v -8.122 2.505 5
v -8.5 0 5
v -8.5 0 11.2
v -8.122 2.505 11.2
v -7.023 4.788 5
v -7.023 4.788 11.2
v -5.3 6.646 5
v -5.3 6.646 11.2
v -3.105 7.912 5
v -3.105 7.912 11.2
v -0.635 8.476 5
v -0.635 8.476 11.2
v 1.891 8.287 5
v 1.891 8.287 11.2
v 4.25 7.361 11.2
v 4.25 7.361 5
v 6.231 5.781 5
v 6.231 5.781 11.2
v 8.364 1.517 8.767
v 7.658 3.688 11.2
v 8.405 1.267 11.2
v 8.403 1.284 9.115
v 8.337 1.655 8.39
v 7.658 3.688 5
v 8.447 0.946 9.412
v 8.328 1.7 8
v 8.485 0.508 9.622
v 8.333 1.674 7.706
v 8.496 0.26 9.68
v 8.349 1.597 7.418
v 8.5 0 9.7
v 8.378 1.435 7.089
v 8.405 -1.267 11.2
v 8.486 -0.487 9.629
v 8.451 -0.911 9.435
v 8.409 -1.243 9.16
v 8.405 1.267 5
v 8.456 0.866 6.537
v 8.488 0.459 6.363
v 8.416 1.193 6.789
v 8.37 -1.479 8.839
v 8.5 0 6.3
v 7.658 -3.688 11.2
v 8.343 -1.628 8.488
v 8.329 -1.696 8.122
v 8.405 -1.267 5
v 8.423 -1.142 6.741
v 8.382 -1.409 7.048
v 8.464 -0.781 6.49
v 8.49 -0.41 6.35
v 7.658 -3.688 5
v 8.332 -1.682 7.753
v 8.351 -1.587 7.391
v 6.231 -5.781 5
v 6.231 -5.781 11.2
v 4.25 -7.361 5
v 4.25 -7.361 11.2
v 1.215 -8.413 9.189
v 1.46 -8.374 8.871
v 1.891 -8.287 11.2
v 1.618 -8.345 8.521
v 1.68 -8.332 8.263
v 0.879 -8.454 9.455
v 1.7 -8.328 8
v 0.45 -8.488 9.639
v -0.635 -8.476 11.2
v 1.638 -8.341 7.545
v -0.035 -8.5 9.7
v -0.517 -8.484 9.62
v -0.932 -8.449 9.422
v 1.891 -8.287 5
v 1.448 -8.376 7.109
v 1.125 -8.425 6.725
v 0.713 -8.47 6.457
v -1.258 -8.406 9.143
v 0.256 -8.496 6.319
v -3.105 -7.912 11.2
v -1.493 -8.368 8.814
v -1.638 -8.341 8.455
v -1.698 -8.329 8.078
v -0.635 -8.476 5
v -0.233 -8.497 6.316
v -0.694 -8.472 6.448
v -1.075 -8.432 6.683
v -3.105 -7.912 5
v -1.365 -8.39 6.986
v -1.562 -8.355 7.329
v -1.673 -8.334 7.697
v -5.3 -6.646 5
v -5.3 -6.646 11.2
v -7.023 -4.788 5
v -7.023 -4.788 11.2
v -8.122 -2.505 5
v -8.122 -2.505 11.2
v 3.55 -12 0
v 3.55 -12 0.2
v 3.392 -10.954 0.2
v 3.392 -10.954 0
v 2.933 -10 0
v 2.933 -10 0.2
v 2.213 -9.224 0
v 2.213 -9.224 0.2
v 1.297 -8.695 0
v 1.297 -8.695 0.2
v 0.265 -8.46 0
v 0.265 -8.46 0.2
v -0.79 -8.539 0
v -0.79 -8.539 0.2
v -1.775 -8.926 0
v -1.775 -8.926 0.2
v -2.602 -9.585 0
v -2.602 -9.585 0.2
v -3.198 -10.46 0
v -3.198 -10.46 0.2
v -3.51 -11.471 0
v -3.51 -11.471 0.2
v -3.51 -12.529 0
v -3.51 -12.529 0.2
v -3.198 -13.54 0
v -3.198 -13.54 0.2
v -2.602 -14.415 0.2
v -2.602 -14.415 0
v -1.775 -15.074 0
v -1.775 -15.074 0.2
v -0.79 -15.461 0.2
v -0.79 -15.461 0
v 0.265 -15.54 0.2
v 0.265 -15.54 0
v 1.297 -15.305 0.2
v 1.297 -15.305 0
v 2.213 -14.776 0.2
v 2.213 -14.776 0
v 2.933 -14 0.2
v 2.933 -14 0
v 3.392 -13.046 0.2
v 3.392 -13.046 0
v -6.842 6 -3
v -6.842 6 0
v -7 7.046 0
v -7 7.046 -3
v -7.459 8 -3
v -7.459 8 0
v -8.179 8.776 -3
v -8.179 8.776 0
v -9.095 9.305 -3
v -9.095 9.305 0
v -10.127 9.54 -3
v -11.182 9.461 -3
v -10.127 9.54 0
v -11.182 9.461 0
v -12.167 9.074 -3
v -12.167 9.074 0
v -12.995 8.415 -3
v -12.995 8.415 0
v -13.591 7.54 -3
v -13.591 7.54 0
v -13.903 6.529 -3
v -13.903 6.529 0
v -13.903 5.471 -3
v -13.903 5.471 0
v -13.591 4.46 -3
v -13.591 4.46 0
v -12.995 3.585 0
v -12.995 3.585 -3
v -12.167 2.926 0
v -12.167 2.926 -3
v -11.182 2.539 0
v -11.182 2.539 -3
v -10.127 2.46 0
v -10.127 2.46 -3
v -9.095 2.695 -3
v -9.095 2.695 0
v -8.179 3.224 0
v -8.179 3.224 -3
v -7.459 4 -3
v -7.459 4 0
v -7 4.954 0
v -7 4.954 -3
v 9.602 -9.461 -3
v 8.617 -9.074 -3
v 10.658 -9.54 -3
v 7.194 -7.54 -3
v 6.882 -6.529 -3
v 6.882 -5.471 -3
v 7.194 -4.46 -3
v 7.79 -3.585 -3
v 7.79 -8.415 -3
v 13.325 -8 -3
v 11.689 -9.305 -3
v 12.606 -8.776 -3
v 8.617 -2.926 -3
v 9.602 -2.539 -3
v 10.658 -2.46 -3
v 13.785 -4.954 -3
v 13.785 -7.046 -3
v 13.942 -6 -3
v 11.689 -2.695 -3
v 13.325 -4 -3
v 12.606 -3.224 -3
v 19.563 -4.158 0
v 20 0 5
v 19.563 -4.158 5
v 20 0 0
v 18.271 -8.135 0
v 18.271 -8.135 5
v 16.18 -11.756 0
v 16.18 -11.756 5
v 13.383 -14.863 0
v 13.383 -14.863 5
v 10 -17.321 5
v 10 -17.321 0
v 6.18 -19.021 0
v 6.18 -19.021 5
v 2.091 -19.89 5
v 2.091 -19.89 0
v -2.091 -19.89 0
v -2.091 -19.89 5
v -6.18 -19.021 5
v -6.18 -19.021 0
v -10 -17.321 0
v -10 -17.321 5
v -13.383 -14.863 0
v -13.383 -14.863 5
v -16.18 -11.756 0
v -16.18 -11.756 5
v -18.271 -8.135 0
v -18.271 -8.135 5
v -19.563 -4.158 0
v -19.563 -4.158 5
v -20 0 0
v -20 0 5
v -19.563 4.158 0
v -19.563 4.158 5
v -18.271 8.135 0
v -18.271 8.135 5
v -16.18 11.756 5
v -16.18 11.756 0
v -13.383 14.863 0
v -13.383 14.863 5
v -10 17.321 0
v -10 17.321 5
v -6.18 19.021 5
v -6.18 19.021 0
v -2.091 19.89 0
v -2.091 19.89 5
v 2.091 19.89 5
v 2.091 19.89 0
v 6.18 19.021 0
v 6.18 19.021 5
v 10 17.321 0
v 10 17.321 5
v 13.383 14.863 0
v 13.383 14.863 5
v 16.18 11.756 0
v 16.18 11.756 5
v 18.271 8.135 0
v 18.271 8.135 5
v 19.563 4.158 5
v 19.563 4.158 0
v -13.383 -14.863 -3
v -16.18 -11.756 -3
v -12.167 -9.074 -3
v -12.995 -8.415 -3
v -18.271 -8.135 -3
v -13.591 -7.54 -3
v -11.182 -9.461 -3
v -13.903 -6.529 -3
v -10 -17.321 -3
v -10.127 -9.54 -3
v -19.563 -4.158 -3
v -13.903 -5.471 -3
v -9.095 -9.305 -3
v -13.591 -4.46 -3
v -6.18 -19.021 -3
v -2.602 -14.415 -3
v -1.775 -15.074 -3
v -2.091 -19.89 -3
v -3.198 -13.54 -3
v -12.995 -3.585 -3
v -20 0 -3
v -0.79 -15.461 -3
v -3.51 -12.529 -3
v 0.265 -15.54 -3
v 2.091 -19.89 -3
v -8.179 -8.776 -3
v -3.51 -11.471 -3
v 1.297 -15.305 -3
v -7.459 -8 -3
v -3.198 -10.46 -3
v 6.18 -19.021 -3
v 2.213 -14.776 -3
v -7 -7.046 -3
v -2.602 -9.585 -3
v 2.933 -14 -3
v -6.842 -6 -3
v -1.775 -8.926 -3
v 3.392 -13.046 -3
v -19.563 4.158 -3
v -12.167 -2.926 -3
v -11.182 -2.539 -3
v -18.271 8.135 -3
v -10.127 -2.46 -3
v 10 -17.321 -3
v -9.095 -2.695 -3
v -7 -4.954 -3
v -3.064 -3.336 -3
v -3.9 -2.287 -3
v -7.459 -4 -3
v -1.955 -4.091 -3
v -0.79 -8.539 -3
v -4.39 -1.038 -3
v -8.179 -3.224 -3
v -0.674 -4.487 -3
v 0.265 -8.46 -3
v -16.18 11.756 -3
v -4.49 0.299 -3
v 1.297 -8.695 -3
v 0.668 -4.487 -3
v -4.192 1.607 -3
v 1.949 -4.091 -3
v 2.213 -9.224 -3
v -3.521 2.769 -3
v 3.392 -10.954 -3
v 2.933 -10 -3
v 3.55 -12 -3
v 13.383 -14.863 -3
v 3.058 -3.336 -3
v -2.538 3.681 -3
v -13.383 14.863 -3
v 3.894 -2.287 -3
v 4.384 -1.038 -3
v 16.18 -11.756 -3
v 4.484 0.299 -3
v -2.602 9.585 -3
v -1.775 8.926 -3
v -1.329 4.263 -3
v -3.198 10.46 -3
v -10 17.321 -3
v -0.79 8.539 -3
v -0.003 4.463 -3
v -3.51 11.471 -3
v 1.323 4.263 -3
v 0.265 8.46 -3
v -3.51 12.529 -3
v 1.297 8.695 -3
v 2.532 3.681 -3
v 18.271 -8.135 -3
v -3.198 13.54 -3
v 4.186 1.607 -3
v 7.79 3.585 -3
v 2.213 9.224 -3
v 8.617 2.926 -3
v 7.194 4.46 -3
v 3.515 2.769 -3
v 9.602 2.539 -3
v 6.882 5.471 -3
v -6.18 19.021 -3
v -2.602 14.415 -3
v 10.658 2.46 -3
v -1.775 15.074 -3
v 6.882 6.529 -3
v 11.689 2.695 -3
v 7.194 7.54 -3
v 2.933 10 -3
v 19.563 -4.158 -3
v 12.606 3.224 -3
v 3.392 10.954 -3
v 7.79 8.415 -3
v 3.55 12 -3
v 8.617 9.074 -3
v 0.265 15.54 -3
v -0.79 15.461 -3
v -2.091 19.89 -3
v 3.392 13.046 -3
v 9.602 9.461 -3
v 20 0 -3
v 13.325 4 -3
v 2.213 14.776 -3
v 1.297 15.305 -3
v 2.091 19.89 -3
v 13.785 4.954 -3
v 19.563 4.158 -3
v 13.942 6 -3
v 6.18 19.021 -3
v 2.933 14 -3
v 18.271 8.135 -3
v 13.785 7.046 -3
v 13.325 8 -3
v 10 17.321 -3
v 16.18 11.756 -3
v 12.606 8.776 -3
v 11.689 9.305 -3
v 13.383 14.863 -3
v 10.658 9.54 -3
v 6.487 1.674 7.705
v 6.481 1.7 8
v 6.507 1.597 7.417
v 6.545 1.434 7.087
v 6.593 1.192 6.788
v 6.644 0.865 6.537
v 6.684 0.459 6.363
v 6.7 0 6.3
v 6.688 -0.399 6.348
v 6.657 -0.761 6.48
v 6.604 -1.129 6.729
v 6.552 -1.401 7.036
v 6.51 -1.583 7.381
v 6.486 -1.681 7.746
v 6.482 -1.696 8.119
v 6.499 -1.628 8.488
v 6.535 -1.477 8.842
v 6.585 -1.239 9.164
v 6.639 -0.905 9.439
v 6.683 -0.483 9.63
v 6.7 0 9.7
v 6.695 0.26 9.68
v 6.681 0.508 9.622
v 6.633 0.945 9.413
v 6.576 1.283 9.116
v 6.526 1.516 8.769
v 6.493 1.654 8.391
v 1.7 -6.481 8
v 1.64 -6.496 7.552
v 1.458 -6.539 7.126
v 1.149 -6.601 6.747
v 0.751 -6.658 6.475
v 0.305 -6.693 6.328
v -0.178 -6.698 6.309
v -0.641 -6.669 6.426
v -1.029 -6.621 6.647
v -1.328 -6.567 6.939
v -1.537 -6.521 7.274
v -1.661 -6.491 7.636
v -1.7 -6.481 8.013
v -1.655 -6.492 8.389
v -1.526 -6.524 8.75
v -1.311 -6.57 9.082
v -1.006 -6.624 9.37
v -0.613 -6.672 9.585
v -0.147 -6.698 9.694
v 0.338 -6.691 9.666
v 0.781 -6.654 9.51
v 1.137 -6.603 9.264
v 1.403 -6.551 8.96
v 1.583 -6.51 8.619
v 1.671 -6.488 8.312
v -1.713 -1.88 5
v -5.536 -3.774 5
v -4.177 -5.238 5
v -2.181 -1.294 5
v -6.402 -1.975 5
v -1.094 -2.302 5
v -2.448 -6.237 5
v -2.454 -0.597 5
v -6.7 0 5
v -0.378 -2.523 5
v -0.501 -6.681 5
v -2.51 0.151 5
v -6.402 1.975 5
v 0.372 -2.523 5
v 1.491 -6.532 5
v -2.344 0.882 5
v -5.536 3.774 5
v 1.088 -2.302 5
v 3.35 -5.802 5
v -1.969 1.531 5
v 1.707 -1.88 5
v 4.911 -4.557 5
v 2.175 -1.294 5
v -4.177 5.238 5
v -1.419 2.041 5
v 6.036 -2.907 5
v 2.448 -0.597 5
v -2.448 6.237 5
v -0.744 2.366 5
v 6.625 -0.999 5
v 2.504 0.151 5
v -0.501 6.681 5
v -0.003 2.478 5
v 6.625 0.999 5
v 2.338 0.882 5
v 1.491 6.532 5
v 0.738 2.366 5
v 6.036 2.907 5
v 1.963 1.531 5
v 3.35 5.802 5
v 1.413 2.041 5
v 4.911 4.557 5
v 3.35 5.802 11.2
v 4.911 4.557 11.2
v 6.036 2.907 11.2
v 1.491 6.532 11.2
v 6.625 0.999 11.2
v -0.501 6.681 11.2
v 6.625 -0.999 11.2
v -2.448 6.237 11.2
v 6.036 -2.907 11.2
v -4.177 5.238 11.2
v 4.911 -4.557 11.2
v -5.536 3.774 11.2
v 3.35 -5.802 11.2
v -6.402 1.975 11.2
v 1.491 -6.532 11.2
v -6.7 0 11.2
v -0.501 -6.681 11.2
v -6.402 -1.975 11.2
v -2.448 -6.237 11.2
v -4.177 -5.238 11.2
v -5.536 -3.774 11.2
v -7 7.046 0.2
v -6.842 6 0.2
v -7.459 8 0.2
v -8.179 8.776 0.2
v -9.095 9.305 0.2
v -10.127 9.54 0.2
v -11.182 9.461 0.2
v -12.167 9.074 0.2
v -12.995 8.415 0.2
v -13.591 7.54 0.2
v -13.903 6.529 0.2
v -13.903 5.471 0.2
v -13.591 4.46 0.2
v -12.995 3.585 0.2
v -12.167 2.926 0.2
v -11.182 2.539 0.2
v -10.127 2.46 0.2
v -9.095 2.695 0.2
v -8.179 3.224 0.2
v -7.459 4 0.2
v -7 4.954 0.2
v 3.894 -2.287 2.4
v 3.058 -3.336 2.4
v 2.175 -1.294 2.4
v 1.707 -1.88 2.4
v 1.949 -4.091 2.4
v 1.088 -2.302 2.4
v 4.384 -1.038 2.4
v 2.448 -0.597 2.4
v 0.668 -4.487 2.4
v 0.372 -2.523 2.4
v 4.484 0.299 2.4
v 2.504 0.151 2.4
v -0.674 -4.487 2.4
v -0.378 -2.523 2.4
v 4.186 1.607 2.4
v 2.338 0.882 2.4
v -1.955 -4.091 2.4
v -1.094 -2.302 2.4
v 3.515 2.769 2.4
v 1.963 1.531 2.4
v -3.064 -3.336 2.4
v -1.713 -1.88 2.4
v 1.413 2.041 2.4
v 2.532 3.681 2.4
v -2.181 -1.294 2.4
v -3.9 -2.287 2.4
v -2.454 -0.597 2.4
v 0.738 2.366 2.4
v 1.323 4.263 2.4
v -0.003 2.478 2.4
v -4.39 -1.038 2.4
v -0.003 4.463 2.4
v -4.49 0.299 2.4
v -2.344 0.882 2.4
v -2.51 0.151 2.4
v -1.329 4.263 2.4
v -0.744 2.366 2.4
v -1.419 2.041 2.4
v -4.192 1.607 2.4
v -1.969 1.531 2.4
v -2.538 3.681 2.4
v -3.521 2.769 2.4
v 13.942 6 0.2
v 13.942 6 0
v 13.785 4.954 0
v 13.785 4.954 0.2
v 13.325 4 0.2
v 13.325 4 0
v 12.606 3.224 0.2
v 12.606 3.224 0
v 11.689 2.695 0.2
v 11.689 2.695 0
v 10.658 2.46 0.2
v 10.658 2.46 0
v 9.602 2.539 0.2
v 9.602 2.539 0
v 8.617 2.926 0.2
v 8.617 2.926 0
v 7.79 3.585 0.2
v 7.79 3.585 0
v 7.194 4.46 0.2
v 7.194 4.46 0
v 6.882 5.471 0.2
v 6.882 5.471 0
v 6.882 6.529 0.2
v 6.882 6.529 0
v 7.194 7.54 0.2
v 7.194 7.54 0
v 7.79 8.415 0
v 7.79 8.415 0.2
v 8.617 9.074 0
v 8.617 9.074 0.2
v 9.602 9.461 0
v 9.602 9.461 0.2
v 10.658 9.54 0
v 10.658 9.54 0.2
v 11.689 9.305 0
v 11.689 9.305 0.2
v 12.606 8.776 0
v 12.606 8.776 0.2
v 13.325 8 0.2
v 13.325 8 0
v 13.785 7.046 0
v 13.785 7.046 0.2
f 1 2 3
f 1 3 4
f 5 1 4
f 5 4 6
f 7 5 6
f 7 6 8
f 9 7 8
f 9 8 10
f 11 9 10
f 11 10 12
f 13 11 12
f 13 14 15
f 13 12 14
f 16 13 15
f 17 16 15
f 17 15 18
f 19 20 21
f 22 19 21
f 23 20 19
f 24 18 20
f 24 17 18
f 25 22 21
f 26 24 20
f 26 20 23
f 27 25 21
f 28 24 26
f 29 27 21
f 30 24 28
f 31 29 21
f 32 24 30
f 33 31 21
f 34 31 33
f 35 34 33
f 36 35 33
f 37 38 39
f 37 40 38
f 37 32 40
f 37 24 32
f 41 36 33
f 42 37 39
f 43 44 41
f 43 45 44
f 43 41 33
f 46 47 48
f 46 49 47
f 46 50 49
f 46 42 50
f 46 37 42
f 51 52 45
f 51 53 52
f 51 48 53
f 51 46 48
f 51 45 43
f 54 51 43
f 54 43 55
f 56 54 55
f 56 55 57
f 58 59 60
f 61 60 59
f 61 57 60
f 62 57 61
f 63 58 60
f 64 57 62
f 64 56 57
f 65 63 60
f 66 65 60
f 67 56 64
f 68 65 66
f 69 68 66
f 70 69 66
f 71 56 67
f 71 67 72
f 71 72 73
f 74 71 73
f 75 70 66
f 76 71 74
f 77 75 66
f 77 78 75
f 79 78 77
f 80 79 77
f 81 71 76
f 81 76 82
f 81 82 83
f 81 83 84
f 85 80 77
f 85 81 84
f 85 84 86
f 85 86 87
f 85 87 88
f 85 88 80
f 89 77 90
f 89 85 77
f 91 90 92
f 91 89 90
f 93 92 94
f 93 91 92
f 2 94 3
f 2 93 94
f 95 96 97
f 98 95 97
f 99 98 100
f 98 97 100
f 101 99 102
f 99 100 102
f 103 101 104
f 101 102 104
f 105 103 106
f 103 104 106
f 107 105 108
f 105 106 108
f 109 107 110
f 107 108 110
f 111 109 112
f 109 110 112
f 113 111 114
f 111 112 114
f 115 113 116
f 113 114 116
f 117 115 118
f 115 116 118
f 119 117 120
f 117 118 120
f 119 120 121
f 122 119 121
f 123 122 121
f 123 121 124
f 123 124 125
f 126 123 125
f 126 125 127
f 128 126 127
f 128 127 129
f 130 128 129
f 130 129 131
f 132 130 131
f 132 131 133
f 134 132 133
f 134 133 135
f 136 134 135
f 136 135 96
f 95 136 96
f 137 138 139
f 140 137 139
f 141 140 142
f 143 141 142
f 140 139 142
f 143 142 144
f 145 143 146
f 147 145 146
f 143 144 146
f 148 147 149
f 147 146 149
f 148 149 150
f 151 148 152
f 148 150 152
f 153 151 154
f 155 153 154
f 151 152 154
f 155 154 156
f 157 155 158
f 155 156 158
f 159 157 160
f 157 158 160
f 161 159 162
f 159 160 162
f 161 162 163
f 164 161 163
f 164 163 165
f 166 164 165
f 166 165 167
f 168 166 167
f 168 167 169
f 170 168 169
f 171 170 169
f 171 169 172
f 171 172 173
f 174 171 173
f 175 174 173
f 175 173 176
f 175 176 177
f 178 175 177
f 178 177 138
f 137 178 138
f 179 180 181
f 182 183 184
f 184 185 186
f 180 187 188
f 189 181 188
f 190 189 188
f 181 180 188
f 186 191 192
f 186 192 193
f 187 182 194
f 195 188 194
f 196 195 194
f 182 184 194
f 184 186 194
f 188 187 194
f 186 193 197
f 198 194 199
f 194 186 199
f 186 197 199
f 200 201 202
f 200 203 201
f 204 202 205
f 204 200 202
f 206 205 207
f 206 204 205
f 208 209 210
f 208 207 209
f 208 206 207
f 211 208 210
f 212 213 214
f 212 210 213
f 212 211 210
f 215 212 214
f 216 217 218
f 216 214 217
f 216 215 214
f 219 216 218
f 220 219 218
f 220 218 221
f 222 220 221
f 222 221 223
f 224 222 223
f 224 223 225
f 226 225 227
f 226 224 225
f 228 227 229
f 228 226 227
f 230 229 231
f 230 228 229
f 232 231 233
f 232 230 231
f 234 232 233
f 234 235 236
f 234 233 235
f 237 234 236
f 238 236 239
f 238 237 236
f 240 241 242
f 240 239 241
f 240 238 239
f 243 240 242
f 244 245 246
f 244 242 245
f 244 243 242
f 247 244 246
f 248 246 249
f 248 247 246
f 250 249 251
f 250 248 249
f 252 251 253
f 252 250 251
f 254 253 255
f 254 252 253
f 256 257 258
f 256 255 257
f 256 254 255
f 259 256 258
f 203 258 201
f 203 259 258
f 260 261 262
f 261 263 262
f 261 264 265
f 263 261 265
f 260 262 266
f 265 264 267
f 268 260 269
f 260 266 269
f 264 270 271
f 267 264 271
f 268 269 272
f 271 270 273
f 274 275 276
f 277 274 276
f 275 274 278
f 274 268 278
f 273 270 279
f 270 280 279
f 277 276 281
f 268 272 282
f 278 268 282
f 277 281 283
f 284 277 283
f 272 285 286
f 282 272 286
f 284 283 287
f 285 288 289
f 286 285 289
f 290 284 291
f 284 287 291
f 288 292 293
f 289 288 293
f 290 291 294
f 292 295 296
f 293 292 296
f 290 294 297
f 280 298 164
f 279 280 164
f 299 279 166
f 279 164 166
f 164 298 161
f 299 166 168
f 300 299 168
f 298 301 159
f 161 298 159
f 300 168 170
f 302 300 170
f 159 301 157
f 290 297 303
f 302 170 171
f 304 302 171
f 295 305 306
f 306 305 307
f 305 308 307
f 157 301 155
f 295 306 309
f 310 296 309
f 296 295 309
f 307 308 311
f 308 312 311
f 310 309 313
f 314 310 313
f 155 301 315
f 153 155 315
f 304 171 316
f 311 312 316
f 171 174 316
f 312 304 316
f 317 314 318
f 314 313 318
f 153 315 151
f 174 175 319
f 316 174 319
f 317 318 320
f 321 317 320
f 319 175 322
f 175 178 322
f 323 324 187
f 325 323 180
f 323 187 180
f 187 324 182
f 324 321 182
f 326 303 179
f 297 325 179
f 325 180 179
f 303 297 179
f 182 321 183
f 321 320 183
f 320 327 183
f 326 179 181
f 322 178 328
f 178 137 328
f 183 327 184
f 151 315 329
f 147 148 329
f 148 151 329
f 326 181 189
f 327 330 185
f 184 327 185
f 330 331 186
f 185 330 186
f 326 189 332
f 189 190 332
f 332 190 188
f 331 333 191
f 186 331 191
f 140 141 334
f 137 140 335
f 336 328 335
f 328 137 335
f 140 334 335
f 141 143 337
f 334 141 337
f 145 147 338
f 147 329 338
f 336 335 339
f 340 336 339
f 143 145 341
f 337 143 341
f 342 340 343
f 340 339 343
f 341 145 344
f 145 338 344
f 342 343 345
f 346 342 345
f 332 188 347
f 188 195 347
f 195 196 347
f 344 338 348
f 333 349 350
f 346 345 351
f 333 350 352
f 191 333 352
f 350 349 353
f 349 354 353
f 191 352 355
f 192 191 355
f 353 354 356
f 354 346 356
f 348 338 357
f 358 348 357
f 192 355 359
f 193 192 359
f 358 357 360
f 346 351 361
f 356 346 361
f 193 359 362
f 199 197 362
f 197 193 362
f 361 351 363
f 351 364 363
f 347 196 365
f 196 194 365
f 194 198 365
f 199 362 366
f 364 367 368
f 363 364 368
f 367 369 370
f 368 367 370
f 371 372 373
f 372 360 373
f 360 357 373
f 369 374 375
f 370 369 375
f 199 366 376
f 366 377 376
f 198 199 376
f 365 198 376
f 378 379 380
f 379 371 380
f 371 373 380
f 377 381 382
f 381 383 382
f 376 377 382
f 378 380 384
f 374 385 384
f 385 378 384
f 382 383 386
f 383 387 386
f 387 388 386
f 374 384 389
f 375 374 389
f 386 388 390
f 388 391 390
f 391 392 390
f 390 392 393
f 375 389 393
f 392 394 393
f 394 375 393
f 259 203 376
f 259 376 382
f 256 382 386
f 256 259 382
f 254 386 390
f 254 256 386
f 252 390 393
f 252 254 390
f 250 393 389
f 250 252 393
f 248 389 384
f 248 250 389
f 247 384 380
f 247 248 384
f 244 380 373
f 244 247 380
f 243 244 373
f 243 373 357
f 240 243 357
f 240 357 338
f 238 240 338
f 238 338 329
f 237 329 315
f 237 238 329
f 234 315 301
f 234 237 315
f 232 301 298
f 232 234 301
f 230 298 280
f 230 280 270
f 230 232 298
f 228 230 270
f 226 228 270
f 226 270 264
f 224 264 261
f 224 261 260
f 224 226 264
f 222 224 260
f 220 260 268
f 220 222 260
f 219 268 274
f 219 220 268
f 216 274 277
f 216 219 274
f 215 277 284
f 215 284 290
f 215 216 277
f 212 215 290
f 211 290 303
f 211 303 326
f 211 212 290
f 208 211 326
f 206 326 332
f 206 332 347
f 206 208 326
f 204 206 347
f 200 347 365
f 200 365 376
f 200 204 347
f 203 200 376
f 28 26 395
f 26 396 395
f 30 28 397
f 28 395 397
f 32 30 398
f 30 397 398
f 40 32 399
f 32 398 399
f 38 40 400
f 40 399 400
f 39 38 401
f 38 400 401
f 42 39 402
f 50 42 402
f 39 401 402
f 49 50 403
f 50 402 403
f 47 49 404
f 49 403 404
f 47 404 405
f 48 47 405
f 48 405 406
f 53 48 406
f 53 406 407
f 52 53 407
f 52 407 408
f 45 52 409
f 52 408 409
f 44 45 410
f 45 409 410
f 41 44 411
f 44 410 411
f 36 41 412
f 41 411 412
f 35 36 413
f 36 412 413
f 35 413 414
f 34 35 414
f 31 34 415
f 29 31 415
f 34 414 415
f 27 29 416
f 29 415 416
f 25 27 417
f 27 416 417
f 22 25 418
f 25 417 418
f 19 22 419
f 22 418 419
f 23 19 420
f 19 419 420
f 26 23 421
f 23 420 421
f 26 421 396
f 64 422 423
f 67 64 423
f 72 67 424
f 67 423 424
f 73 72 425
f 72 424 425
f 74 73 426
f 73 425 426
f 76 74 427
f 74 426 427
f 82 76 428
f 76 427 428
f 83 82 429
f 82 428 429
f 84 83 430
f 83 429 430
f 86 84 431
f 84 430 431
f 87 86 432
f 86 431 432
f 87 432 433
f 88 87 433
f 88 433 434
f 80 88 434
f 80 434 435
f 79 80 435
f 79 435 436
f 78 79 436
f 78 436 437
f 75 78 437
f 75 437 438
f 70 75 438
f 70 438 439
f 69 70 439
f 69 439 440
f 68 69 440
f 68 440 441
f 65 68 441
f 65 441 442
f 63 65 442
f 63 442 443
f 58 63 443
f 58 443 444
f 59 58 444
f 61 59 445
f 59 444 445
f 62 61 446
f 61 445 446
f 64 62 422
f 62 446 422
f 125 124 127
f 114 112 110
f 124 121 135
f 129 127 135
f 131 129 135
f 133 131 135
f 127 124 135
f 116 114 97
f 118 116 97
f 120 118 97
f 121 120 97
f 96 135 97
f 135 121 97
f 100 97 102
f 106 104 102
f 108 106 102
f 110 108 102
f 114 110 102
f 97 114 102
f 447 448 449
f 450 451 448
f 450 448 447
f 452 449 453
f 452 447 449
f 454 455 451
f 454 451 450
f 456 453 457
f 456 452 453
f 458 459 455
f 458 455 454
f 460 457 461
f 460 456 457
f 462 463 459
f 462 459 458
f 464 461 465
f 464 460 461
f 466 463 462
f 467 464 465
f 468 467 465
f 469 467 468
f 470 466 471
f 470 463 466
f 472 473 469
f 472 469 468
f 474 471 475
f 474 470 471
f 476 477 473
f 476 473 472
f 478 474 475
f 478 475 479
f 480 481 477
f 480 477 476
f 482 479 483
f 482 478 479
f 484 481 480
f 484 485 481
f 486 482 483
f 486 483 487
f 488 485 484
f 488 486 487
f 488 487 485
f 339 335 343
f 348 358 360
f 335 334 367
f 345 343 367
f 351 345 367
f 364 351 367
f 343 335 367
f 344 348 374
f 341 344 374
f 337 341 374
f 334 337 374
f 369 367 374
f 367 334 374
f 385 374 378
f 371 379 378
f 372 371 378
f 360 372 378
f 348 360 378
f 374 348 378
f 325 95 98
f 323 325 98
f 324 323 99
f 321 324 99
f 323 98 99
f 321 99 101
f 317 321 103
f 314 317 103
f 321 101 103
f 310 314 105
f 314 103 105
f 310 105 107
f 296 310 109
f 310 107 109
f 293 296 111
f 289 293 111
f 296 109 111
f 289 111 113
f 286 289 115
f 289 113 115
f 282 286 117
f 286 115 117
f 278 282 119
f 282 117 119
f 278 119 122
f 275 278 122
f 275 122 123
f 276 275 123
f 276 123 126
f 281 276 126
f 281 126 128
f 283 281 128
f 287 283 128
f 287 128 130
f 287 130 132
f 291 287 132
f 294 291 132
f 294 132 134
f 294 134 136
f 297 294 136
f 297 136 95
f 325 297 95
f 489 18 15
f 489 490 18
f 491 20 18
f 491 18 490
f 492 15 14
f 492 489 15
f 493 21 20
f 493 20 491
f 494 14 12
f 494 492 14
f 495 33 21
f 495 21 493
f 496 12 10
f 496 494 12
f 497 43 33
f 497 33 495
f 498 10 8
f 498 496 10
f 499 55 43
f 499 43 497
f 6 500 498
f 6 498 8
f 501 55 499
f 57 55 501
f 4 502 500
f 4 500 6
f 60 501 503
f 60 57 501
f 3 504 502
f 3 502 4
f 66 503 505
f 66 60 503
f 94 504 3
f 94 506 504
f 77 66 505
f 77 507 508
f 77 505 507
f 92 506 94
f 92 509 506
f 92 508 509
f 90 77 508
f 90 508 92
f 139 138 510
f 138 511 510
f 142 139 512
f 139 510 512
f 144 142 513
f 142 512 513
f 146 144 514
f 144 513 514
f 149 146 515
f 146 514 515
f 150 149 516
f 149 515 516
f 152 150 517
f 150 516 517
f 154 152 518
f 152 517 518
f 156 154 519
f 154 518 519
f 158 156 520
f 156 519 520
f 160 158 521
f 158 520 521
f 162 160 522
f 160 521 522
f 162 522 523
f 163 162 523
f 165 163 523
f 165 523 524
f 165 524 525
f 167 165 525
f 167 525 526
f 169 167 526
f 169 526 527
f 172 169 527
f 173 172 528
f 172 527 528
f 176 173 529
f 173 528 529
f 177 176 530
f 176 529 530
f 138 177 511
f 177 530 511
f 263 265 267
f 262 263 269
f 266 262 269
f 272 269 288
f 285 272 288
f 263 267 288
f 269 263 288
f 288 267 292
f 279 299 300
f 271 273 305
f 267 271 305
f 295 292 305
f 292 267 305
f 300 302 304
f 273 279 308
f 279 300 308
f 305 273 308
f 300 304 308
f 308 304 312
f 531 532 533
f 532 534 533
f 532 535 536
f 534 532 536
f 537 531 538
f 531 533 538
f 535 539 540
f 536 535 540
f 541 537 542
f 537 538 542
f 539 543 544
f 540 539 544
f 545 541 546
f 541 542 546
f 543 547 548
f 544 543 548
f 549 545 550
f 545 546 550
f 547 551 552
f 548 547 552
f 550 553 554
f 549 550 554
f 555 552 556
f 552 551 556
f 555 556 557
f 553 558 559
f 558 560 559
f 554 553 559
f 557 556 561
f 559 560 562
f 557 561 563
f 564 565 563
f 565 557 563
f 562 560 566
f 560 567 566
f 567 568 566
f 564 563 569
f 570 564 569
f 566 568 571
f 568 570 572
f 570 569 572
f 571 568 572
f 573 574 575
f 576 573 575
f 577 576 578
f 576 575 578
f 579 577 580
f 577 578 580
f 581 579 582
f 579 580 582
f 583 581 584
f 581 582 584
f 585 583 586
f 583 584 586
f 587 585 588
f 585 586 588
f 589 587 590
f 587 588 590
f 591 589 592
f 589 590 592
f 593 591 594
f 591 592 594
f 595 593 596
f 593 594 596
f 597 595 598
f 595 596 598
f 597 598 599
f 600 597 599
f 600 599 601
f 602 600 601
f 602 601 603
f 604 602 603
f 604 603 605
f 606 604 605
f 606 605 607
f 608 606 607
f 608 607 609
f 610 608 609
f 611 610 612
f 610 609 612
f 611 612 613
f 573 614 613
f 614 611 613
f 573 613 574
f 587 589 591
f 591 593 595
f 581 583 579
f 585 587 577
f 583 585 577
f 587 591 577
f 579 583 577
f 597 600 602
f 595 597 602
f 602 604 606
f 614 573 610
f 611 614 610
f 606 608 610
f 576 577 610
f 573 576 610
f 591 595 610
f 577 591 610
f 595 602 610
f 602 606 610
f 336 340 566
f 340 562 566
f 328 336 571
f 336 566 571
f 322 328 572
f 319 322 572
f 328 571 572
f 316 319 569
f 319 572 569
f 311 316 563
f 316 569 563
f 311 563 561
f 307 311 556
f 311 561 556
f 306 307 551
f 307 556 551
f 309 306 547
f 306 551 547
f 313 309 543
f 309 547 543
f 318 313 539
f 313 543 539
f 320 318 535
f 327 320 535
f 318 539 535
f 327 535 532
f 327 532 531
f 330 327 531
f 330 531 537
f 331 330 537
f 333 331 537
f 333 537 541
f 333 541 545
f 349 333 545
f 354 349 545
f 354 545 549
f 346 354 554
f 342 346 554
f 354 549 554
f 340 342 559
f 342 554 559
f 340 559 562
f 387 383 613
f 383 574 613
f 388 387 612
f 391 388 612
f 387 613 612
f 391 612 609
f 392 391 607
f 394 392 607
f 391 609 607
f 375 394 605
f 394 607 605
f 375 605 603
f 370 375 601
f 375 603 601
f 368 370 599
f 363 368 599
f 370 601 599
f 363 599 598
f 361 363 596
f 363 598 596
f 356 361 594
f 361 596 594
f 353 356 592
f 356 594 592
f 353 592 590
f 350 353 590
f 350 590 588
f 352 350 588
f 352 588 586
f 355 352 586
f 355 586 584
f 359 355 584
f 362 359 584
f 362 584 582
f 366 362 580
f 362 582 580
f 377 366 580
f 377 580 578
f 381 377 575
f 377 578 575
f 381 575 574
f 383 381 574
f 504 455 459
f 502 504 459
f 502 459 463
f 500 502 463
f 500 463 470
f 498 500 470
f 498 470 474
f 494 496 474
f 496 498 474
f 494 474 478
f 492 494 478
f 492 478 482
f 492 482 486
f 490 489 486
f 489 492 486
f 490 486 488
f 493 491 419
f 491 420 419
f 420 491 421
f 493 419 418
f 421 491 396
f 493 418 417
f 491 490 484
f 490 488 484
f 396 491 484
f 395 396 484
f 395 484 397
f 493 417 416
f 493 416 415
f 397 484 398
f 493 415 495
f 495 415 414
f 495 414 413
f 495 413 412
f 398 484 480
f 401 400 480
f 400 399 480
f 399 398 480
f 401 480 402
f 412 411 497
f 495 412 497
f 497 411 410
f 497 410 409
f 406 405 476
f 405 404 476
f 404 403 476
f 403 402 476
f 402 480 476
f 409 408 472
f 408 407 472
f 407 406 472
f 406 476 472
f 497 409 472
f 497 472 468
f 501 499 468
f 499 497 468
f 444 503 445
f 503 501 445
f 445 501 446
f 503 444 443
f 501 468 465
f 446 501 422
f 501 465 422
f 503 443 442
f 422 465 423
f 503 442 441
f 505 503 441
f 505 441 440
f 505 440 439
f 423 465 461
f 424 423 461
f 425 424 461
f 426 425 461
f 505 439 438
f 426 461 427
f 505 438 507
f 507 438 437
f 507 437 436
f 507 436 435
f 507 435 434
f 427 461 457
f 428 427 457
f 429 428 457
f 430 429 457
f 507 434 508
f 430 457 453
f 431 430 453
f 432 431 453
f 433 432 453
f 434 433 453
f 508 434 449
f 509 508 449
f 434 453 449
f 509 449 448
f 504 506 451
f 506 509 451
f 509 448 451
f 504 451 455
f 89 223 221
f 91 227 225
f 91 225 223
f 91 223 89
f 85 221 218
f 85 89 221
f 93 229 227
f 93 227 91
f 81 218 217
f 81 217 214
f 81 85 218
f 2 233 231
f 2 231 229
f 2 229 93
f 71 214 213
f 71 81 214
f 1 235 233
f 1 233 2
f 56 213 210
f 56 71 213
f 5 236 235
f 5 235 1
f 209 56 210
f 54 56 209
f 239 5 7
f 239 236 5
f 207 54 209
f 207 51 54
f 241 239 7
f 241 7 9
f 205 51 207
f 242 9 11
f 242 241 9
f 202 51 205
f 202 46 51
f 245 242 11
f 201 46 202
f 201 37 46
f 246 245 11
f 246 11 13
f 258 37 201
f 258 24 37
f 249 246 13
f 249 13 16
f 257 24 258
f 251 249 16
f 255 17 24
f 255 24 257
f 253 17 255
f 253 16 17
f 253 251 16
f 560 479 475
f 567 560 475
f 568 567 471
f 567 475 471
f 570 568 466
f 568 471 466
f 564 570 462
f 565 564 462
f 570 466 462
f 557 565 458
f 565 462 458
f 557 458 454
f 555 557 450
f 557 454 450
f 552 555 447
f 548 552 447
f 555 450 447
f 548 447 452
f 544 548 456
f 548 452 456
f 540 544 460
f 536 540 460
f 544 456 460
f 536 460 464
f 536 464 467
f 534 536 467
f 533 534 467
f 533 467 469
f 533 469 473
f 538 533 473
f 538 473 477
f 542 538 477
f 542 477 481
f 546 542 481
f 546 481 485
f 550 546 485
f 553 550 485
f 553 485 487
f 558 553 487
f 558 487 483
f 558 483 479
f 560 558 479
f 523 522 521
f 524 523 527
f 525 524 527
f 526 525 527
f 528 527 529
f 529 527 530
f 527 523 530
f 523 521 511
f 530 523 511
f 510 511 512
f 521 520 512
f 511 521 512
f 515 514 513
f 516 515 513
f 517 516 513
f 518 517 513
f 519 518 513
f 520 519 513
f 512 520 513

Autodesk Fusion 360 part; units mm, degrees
sketch "Sketch1" plane through (0, 0, 0) normal (0, 0, 1) x (1, 0, 0)
  circle A0 centre (0, 0) radius 20
  circle A1 centre (0, -12) radius 3.55
  circle A2 centre (0, 12) radius 3.55
  circle A3 centre (10.3923, -6) radius 3.55
  circle A4 centre (-10.3923, 6) radius 3.55
  circle A5 centre (-10.3923, -6) radius 3.55
  circle A6 centre (0, 0) radius 2.1
  line L0 (0, 0) -> (0, 12) construction
  line L1 (0, 0) -> (10.3923, -6) construction
  line L2 (0, 0) -> (10.3923, 6) construction
  circle A7 centre (10.3923, 6) radius 3.55
  dimension "d1" = 40
  dimension "d2" = 7.1
  dimension "d3" = 7.1
  dimension "d6" = 7.1
  dimension "d12" = 12
  dimension "d15" = 12
  dimension "d16" = 7.1
  dimension "d17" = 12
  dimension "d19" = 7.1
  dimension "d23" = 12
  dimension "d25" = 4.2
  dimension "d34" = 60
  dimension "d37" = 60
  dimension "d38" = 60
  dimension "d39" = 60
  dimension "d49" = 12
  dimension "d50" = 7.1
  dimension "d51" = 60
  dimension "d52" = 60
  dimension "d85" = 12
sketch "Sketch2" plane through (0, 0, 0) normal (0, 0, 1) x (1, 0, 0)
  circle A0 centre (0, 0) radius 20
  line L0 (0, 0) -> (0, -9) construction
  line L1 (0, 0) -> (0, 9) construction
  line L2 (20, -0.0372) -> (-20, -0.0372) construction
  line L3 (-14, -0.0372) -> (-20, -0.0372) construction
  dimension "d26" = 40
  dimension "d40" = 6
extrude "Extrude1" add sketch "Sketch2" along normal blind 5 and the other way blind 3
sketch "Sketch3" plane through (0, 0, 0) normal (0, 0, 1) x (1, 0, 0)
hole "Hole1" at (-0.003, -0.037, -3) direction (0, 0, 1) diameter 5.029 depth 14 tip angle 180 counterbore diameter 9 counterbore depth 5.4
thread "Thread1" "ISO Metric profile 5.5 M5.5x0.5 6H"
extrude "Extrude2" cut sketch "Sketch1" along normal blind -3 and the other way blind -0.2 contours A1 | A2 | A3 | A4 | A5
extrude "Extrude4" cut sketch "Sketch1" along normal blind 0.2 and the other way blind 3 contours A7
sketch "Sketch4" plane through (0, 0, 5) normal (0, 0, 1) x (-1, 0, 0)
  circle A0 centre (0.003, 0.037) radius 2.5143
  circle A1 centre (0, 0) radius 20
  circle A2 centre (0, 0) radius 6.5
  circle A3 centre (0, 0) radius 3
  dimension "d57" = 13
  dimension "d58" = 6
sketch "Sketch5" plane through (0, 0, 5) normal (0, 0, 1) x (-1, 0, 0)
  circle A0 centre (0, 0) radius 20
  circle A1 centre (0, 0) radius 8.5
  circle A2 centre (0, 0) radius 6.7
  circle A3 centre (0.003, 0.037) radius 2.5143
  dimension "d61" = 17
  dimension "d62" = 13.4
extrude "Extrude6" add sketch "Sketch5" along normal blind 6.2 contours A1
sketch "Sketch6" plane through (0, 0, 5) normal (0, 0, 1) x (-1, 0, 0)
  circle A0 centre (0, 0) radius 20
  circle A1 centre (0, 0) radius 8.5
  circle A2 centre (0, 0) radius 6.5
  dimension "d65" = 13
sketch "Sketch7" plane through (0, 0, 0) normal (1, 0, 0) x (0, 1, 0)
sketch "Sketch8" plane through (0, 0, 11.2) normal (0, 0, 1) x (-1, 0, 0)
  circle A0 centre (0, 0) radius 6.7
  circle A1 centre (0, 0) radius 8.5
sketch "Sketch9" plane through (0, 0, 11.2) normal (0, 0, 1) x (-1, 0, 0)
  line L0 (0, -8.4831) -> (0, 8.4366) construction
  line L1 (8.5, -0.0044) -> (-8.5, -0.0044) construction
  circle A0 centre (0, 0) radius 8.5 construction
  arc A1 (0, -8.4831) -> (6.3875, -5.608) centre (0.0534, -0.0686) ccw
extrude "Extrude3" cut sketch "Sketch1" along normal blind 3.2 contours A1 | A2 | A3 | A4 | A5 | A7
sketch "Sketch10" plane through (0, 0, 0) normal (1, 0, 0) x (0, 1, 0)
  circle A0 centre (0.01, 9) radius 1.5
  line L0 (0, 1.9) -> (0, 14.3)
  circle A1 centre (0.01, 9) radius 1.25
  dimension "d66" = 3
  dimension "d67" = 0.01
  dimension "d68" = 2.5
sketch "Sketch11" plane through (0, 0, 0) normal (0, 1, 0) x (1, 0, 0)
  line L0 (0, -5) -> (0, -11) construction
  line L1 (0, -5) -> (0, -11) construction
  line L2 (0, -5) -> (0, -8) construction
  circle A0 centre (0, -8) radius 1.25
  circle A1 centre (0, -8) radius 1.7
  dimension "d69" = 3
  dimension "d70" = 2.5
  dimension "d86" = 3.4
extrude "Extrude7" cut sketch "Sketch11" against normal blind 19 contours A0
sketch "Sketch12" plane through (0, 0, 0) normal (1, 0, 0) x (0, 1, 0)
  line L0 (0, 5) -> (0, 11)
  line L1 (0, 11) -> (0, 8)
  circle A0 centre (0, 8) radius 1.25
  circle A1 centre (0, 8) radius 1.7
  dimension "d73" = 3
  dimension "d74" = 2.5
  dimension "d89" = 3.4
extrude "Extrude8" cut sketch "Sketch12" along normal blind 18 contours L0 L1 A0 | L0 L1 A0
extrude "Extrude9" cut sketch "Sketch11" against normal blind 11
extrude "Extrude10" cut sketch "Sketch12" along normal blind 15 contours L0 L1 A0 A1 | L0 L1 A0 A1
extrude "Extrude11" add 3 faces at (-10.4048, -6.9337, 3.2) (-0.8737, 12.0232, 3.2) (9.1513, -4.7203, 3.2) along direction (0, 0, -1) blind 6.2
extrude "Extrude12" add 3 faces at (-0.8737, -11.9768, 3.2) (9.7613, 6.2168, 3.2) (-11.4191, 6.8816, 3.2) along direction (0, 0, -1) blind 3
thread "Thread3" [suppressed]
